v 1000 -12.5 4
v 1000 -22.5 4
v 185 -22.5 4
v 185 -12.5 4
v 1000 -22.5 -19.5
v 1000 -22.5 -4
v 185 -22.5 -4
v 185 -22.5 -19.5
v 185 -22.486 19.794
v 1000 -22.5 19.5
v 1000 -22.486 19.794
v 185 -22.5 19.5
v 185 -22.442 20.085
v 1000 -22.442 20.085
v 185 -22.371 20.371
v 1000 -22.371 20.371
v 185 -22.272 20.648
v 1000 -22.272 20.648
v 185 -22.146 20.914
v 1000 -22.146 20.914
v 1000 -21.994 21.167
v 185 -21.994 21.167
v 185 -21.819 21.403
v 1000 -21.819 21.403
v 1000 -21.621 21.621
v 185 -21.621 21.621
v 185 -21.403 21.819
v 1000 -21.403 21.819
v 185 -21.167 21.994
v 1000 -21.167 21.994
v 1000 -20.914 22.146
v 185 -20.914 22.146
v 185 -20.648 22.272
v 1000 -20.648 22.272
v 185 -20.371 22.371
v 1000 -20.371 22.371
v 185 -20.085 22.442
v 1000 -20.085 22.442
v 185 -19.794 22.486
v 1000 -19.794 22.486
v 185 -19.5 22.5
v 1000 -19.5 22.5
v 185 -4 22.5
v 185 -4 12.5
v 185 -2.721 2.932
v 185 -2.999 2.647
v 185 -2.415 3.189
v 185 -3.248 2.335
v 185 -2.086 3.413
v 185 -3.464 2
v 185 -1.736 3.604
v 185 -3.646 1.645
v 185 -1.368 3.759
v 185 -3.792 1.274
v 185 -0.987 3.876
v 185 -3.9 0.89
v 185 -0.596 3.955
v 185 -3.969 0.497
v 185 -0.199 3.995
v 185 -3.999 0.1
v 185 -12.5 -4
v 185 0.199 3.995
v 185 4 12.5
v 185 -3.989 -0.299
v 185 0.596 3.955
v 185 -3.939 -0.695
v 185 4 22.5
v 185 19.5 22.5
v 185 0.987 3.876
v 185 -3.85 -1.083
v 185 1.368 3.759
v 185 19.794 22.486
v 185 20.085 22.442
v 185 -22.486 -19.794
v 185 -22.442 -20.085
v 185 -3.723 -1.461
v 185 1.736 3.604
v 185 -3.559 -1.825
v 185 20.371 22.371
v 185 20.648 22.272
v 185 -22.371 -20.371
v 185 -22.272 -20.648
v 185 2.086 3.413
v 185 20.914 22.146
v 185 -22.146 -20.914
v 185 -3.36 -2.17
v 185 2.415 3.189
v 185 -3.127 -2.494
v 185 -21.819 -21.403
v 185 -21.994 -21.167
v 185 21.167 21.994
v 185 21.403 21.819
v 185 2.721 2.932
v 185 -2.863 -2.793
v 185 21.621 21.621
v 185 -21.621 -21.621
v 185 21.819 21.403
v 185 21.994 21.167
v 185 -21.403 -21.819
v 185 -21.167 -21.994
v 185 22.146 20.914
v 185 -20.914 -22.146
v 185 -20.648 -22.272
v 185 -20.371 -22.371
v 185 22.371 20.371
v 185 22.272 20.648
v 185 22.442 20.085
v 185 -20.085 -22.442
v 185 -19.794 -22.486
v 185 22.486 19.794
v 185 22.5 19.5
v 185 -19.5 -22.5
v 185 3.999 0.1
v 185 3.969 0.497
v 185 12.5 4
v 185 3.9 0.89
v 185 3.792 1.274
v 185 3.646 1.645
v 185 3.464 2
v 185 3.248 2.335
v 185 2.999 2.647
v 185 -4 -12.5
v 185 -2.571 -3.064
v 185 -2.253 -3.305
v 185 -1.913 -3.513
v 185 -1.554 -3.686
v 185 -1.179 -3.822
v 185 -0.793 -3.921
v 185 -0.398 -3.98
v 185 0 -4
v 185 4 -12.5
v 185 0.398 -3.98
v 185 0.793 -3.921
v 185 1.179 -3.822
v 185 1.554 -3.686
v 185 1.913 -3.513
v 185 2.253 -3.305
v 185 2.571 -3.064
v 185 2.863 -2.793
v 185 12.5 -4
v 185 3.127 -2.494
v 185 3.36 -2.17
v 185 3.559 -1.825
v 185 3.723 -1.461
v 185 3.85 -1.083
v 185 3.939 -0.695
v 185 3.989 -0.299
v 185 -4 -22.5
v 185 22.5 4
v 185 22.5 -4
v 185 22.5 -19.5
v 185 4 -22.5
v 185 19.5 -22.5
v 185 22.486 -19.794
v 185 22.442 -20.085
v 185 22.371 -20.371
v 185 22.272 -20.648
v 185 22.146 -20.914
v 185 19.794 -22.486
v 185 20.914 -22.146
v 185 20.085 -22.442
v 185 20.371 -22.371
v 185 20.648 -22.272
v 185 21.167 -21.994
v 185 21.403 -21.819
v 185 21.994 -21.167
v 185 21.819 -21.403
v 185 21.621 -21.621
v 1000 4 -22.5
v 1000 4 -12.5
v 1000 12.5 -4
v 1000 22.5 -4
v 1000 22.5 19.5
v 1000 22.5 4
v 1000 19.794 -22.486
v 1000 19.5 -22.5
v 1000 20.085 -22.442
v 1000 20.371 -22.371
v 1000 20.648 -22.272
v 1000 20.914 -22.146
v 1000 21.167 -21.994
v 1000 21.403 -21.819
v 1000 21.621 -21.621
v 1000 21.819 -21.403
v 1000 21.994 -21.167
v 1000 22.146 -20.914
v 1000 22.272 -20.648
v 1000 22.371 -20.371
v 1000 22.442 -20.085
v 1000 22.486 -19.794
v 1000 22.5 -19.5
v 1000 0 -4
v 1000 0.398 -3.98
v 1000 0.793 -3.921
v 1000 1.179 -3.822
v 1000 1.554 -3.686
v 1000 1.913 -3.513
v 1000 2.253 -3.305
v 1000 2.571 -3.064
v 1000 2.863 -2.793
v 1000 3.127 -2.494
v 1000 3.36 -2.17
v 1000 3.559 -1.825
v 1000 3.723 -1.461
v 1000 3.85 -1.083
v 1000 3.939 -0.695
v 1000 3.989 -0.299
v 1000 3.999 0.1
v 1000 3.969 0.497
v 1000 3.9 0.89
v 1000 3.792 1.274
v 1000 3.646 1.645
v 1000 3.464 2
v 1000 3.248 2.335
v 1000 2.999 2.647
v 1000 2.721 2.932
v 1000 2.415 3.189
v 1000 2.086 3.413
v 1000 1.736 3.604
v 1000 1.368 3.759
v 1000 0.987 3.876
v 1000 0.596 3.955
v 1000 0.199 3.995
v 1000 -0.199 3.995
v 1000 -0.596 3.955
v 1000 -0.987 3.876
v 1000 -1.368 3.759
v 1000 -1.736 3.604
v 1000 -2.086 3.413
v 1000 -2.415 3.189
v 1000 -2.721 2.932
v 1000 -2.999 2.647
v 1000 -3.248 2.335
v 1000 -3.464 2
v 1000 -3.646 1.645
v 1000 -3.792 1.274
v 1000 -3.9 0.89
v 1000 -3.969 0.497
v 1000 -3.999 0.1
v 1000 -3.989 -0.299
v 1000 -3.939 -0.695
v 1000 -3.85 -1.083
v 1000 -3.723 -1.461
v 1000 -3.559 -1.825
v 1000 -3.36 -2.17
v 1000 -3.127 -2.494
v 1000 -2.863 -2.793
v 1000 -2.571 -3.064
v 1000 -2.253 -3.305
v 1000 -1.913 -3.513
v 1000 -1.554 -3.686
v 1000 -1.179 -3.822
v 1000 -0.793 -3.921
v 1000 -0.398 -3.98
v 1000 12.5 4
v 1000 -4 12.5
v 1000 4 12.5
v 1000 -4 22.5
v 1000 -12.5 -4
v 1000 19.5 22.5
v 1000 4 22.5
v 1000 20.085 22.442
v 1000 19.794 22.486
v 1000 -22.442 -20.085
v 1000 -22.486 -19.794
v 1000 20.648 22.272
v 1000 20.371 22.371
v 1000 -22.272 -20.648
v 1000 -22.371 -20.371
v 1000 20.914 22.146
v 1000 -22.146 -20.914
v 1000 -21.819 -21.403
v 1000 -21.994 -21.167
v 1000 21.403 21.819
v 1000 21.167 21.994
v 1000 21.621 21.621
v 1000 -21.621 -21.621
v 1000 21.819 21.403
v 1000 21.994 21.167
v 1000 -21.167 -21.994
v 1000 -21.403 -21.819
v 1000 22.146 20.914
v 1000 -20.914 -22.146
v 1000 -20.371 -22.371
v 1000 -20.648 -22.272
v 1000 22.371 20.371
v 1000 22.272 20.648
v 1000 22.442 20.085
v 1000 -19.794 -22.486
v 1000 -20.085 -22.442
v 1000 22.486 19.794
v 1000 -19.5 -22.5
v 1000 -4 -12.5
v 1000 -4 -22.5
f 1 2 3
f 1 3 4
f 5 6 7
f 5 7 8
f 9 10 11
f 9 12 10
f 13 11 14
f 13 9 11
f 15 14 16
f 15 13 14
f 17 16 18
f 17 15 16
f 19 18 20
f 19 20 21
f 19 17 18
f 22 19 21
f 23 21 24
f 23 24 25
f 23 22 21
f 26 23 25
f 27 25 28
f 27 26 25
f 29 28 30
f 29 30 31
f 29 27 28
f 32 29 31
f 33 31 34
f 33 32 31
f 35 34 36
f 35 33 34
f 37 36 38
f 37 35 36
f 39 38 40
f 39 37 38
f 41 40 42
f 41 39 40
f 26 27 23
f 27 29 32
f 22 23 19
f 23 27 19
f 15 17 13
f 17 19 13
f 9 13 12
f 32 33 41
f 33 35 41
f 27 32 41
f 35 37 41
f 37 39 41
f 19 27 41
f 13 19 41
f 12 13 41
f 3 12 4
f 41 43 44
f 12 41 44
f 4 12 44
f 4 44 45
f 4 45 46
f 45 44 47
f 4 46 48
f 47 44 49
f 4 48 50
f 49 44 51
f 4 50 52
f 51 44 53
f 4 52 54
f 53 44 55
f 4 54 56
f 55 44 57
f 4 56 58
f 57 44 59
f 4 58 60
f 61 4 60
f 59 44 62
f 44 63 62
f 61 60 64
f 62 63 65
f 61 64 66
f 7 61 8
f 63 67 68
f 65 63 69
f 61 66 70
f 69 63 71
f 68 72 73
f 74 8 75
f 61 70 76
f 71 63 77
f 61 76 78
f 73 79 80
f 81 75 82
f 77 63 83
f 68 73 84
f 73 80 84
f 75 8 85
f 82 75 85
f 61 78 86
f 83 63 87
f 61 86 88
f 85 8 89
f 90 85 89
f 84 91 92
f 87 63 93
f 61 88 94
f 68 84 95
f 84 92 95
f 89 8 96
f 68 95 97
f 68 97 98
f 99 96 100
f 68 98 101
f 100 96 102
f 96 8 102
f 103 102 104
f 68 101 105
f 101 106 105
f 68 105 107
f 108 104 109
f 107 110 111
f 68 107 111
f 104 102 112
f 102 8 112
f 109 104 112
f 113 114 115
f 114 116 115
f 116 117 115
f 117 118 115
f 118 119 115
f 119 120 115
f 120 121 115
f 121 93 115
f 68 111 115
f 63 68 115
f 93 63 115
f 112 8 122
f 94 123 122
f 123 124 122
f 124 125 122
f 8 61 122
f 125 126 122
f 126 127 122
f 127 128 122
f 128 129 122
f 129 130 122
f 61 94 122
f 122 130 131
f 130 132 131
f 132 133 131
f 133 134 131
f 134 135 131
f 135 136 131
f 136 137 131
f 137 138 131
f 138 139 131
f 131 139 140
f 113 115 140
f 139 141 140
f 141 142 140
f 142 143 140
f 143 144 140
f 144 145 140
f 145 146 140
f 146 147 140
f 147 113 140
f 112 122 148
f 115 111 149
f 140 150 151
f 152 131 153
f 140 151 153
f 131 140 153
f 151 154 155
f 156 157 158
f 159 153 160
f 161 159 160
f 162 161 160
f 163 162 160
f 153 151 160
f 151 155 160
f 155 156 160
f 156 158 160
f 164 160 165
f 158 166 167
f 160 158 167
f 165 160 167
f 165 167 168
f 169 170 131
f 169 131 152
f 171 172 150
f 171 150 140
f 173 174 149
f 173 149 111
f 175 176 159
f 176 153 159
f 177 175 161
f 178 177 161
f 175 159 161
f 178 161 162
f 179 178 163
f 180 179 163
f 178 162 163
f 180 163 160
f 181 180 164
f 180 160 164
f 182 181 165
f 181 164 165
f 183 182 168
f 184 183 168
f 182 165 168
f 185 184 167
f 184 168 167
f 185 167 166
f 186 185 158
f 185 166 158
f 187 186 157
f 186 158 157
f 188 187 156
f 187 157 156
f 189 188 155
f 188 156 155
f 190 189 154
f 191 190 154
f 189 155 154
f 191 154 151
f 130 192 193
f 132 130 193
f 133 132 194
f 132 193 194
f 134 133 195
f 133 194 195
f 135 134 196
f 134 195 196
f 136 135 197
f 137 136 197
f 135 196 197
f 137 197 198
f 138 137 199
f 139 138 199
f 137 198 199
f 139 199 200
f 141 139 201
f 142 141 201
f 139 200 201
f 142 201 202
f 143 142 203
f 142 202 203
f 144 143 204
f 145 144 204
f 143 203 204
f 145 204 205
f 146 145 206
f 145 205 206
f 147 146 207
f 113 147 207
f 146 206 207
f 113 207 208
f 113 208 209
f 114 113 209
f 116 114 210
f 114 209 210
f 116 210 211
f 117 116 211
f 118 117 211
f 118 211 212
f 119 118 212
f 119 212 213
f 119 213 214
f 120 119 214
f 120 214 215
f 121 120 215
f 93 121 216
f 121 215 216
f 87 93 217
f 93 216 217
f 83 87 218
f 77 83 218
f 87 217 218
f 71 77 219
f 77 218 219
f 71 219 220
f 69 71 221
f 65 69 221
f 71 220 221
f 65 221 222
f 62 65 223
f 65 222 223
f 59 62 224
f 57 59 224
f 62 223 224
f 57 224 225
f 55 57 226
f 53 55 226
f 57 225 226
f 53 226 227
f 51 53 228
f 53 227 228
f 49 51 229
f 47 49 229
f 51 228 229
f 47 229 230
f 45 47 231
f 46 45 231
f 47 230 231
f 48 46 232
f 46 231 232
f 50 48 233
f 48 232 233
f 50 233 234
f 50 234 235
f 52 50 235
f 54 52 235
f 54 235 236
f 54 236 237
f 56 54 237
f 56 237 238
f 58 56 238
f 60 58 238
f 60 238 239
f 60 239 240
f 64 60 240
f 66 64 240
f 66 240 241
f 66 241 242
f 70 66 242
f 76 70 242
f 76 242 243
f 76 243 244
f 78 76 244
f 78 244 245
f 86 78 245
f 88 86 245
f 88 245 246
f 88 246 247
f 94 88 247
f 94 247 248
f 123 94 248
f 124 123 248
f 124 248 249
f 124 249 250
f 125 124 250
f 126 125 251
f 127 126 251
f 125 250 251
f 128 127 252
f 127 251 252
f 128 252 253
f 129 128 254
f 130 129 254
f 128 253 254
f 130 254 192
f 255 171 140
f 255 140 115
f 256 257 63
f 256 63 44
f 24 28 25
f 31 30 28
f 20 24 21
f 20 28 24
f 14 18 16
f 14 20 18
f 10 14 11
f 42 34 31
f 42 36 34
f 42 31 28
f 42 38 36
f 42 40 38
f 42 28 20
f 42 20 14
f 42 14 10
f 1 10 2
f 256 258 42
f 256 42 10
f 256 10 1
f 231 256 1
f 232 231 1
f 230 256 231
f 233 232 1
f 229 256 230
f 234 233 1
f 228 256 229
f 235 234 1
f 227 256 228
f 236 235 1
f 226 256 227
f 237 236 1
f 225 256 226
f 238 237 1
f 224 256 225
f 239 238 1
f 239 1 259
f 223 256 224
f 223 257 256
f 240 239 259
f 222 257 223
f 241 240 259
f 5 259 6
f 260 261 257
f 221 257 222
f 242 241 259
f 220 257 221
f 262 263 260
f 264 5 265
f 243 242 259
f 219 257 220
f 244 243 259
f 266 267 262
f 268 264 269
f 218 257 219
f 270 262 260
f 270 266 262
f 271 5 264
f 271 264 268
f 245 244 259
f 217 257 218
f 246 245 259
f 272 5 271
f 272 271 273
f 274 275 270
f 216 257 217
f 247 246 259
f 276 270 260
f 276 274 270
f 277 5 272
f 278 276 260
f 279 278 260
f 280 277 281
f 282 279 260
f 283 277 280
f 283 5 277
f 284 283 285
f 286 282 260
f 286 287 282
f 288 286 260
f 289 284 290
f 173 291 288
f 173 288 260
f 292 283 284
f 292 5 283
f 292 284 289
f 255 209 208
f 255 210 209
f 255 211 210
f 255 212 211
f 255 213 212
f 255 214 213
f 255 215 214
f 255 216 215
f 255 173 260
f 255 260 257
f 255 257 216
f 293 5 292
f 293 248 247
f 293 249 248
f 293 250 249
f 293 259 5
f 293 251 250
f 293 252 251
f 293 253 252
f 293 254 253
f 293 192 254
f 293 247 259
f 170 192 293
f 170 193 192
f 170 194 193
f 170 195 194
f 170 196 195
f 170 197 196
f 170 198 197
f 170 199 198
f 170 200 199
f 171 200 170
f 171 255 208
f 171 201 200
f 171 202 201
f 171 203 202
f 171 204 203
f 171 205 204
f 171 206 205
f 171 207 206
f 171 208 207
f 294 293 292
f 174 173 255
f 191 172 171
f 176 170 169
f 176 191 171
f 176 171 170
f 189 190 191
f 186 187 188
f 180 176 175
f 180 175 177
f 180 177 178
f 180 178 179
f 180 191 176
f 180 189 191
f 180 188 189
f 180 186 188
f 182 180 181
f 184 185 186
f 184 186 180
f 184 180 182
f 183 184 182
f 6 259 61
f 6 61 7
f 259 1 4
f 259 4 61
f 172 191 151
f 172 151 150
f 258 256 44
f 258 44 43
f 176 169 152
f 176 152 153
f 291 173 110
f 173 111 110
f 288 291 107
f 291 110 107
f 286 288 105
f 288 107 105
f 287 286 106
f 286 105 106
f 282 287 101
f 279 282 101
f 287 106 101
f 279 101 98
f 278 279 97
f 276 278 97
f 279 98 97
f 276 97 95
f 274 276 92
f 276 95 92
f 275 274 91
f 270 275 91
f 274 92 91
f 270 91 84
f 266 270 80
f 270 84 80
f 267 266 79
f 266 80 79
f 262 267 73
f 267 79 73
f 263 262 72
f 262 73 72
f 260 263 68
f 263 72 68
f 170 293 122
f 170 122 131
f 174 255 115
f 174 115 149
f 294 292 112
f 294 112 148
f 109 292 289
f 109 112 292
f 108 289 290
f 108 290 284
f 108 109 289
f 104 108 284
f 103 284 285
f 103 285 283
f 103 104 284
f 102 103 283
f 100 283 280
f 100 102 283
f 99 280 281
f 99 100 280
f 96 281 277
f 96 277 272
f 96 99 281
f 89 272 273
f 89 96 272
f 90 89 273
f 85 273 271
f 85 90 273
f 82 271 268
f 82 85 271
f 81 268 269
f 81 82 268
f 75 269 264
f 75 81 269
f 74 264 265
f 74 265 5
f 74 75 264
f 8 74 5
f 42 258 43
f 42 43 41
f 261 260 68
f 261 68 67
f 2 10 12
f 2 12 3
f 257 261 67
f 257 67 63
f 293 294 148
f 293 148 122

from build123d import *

# Parameters (mm, degrees)
ESQUISSE1_R        = 4
BOSS_EXTRU_1_DEPTH = 815
CONG_1_R           = 3


with BuildPart() as part:
    # Esquisse1 → Boss.-Extru.1 (new body)
    with BuildSketch(Plane(origin=(1000, 0, 0), x_dir=(0, 0, -1), z_dir=(1, 0, 0))):
        Polygon((22.5, -4), (12.5, -4), (12.5, 4), (22.5, 4), (22.5, 22.5), (4, 22.5), (4, 12.5), (-4, 12.5), (-4, 22.5), (-22.5, 22.5), (-22.5, 4), (-12.5, 4), (-12.5, -4), (-22.5, -4), (-22.5, -22.5), (-4, -22.5), (-4, -12.5), (4, -12.5), (4, -22.5), (22.5, -22.5), align=None)
        Circle(ESQUISSE1_R, mode=Mode.SUBTRACT)
    extrude(amount=-BOSS_EXTRU_1_DEPTH)

    # Congé1
    cong_1_edges = [part.edges().sort_by_distance(p)[0] for p in [
        (592.5, -22.5, -22.5),
        (592.5, -22.5, 22.5),
        (592.5, 22.5, 22.5),
        (592.5, 22.5, -22.5),
    ]]
    fillet(cong_1_edges, radius=CONG_1_R)


solid = part.part
